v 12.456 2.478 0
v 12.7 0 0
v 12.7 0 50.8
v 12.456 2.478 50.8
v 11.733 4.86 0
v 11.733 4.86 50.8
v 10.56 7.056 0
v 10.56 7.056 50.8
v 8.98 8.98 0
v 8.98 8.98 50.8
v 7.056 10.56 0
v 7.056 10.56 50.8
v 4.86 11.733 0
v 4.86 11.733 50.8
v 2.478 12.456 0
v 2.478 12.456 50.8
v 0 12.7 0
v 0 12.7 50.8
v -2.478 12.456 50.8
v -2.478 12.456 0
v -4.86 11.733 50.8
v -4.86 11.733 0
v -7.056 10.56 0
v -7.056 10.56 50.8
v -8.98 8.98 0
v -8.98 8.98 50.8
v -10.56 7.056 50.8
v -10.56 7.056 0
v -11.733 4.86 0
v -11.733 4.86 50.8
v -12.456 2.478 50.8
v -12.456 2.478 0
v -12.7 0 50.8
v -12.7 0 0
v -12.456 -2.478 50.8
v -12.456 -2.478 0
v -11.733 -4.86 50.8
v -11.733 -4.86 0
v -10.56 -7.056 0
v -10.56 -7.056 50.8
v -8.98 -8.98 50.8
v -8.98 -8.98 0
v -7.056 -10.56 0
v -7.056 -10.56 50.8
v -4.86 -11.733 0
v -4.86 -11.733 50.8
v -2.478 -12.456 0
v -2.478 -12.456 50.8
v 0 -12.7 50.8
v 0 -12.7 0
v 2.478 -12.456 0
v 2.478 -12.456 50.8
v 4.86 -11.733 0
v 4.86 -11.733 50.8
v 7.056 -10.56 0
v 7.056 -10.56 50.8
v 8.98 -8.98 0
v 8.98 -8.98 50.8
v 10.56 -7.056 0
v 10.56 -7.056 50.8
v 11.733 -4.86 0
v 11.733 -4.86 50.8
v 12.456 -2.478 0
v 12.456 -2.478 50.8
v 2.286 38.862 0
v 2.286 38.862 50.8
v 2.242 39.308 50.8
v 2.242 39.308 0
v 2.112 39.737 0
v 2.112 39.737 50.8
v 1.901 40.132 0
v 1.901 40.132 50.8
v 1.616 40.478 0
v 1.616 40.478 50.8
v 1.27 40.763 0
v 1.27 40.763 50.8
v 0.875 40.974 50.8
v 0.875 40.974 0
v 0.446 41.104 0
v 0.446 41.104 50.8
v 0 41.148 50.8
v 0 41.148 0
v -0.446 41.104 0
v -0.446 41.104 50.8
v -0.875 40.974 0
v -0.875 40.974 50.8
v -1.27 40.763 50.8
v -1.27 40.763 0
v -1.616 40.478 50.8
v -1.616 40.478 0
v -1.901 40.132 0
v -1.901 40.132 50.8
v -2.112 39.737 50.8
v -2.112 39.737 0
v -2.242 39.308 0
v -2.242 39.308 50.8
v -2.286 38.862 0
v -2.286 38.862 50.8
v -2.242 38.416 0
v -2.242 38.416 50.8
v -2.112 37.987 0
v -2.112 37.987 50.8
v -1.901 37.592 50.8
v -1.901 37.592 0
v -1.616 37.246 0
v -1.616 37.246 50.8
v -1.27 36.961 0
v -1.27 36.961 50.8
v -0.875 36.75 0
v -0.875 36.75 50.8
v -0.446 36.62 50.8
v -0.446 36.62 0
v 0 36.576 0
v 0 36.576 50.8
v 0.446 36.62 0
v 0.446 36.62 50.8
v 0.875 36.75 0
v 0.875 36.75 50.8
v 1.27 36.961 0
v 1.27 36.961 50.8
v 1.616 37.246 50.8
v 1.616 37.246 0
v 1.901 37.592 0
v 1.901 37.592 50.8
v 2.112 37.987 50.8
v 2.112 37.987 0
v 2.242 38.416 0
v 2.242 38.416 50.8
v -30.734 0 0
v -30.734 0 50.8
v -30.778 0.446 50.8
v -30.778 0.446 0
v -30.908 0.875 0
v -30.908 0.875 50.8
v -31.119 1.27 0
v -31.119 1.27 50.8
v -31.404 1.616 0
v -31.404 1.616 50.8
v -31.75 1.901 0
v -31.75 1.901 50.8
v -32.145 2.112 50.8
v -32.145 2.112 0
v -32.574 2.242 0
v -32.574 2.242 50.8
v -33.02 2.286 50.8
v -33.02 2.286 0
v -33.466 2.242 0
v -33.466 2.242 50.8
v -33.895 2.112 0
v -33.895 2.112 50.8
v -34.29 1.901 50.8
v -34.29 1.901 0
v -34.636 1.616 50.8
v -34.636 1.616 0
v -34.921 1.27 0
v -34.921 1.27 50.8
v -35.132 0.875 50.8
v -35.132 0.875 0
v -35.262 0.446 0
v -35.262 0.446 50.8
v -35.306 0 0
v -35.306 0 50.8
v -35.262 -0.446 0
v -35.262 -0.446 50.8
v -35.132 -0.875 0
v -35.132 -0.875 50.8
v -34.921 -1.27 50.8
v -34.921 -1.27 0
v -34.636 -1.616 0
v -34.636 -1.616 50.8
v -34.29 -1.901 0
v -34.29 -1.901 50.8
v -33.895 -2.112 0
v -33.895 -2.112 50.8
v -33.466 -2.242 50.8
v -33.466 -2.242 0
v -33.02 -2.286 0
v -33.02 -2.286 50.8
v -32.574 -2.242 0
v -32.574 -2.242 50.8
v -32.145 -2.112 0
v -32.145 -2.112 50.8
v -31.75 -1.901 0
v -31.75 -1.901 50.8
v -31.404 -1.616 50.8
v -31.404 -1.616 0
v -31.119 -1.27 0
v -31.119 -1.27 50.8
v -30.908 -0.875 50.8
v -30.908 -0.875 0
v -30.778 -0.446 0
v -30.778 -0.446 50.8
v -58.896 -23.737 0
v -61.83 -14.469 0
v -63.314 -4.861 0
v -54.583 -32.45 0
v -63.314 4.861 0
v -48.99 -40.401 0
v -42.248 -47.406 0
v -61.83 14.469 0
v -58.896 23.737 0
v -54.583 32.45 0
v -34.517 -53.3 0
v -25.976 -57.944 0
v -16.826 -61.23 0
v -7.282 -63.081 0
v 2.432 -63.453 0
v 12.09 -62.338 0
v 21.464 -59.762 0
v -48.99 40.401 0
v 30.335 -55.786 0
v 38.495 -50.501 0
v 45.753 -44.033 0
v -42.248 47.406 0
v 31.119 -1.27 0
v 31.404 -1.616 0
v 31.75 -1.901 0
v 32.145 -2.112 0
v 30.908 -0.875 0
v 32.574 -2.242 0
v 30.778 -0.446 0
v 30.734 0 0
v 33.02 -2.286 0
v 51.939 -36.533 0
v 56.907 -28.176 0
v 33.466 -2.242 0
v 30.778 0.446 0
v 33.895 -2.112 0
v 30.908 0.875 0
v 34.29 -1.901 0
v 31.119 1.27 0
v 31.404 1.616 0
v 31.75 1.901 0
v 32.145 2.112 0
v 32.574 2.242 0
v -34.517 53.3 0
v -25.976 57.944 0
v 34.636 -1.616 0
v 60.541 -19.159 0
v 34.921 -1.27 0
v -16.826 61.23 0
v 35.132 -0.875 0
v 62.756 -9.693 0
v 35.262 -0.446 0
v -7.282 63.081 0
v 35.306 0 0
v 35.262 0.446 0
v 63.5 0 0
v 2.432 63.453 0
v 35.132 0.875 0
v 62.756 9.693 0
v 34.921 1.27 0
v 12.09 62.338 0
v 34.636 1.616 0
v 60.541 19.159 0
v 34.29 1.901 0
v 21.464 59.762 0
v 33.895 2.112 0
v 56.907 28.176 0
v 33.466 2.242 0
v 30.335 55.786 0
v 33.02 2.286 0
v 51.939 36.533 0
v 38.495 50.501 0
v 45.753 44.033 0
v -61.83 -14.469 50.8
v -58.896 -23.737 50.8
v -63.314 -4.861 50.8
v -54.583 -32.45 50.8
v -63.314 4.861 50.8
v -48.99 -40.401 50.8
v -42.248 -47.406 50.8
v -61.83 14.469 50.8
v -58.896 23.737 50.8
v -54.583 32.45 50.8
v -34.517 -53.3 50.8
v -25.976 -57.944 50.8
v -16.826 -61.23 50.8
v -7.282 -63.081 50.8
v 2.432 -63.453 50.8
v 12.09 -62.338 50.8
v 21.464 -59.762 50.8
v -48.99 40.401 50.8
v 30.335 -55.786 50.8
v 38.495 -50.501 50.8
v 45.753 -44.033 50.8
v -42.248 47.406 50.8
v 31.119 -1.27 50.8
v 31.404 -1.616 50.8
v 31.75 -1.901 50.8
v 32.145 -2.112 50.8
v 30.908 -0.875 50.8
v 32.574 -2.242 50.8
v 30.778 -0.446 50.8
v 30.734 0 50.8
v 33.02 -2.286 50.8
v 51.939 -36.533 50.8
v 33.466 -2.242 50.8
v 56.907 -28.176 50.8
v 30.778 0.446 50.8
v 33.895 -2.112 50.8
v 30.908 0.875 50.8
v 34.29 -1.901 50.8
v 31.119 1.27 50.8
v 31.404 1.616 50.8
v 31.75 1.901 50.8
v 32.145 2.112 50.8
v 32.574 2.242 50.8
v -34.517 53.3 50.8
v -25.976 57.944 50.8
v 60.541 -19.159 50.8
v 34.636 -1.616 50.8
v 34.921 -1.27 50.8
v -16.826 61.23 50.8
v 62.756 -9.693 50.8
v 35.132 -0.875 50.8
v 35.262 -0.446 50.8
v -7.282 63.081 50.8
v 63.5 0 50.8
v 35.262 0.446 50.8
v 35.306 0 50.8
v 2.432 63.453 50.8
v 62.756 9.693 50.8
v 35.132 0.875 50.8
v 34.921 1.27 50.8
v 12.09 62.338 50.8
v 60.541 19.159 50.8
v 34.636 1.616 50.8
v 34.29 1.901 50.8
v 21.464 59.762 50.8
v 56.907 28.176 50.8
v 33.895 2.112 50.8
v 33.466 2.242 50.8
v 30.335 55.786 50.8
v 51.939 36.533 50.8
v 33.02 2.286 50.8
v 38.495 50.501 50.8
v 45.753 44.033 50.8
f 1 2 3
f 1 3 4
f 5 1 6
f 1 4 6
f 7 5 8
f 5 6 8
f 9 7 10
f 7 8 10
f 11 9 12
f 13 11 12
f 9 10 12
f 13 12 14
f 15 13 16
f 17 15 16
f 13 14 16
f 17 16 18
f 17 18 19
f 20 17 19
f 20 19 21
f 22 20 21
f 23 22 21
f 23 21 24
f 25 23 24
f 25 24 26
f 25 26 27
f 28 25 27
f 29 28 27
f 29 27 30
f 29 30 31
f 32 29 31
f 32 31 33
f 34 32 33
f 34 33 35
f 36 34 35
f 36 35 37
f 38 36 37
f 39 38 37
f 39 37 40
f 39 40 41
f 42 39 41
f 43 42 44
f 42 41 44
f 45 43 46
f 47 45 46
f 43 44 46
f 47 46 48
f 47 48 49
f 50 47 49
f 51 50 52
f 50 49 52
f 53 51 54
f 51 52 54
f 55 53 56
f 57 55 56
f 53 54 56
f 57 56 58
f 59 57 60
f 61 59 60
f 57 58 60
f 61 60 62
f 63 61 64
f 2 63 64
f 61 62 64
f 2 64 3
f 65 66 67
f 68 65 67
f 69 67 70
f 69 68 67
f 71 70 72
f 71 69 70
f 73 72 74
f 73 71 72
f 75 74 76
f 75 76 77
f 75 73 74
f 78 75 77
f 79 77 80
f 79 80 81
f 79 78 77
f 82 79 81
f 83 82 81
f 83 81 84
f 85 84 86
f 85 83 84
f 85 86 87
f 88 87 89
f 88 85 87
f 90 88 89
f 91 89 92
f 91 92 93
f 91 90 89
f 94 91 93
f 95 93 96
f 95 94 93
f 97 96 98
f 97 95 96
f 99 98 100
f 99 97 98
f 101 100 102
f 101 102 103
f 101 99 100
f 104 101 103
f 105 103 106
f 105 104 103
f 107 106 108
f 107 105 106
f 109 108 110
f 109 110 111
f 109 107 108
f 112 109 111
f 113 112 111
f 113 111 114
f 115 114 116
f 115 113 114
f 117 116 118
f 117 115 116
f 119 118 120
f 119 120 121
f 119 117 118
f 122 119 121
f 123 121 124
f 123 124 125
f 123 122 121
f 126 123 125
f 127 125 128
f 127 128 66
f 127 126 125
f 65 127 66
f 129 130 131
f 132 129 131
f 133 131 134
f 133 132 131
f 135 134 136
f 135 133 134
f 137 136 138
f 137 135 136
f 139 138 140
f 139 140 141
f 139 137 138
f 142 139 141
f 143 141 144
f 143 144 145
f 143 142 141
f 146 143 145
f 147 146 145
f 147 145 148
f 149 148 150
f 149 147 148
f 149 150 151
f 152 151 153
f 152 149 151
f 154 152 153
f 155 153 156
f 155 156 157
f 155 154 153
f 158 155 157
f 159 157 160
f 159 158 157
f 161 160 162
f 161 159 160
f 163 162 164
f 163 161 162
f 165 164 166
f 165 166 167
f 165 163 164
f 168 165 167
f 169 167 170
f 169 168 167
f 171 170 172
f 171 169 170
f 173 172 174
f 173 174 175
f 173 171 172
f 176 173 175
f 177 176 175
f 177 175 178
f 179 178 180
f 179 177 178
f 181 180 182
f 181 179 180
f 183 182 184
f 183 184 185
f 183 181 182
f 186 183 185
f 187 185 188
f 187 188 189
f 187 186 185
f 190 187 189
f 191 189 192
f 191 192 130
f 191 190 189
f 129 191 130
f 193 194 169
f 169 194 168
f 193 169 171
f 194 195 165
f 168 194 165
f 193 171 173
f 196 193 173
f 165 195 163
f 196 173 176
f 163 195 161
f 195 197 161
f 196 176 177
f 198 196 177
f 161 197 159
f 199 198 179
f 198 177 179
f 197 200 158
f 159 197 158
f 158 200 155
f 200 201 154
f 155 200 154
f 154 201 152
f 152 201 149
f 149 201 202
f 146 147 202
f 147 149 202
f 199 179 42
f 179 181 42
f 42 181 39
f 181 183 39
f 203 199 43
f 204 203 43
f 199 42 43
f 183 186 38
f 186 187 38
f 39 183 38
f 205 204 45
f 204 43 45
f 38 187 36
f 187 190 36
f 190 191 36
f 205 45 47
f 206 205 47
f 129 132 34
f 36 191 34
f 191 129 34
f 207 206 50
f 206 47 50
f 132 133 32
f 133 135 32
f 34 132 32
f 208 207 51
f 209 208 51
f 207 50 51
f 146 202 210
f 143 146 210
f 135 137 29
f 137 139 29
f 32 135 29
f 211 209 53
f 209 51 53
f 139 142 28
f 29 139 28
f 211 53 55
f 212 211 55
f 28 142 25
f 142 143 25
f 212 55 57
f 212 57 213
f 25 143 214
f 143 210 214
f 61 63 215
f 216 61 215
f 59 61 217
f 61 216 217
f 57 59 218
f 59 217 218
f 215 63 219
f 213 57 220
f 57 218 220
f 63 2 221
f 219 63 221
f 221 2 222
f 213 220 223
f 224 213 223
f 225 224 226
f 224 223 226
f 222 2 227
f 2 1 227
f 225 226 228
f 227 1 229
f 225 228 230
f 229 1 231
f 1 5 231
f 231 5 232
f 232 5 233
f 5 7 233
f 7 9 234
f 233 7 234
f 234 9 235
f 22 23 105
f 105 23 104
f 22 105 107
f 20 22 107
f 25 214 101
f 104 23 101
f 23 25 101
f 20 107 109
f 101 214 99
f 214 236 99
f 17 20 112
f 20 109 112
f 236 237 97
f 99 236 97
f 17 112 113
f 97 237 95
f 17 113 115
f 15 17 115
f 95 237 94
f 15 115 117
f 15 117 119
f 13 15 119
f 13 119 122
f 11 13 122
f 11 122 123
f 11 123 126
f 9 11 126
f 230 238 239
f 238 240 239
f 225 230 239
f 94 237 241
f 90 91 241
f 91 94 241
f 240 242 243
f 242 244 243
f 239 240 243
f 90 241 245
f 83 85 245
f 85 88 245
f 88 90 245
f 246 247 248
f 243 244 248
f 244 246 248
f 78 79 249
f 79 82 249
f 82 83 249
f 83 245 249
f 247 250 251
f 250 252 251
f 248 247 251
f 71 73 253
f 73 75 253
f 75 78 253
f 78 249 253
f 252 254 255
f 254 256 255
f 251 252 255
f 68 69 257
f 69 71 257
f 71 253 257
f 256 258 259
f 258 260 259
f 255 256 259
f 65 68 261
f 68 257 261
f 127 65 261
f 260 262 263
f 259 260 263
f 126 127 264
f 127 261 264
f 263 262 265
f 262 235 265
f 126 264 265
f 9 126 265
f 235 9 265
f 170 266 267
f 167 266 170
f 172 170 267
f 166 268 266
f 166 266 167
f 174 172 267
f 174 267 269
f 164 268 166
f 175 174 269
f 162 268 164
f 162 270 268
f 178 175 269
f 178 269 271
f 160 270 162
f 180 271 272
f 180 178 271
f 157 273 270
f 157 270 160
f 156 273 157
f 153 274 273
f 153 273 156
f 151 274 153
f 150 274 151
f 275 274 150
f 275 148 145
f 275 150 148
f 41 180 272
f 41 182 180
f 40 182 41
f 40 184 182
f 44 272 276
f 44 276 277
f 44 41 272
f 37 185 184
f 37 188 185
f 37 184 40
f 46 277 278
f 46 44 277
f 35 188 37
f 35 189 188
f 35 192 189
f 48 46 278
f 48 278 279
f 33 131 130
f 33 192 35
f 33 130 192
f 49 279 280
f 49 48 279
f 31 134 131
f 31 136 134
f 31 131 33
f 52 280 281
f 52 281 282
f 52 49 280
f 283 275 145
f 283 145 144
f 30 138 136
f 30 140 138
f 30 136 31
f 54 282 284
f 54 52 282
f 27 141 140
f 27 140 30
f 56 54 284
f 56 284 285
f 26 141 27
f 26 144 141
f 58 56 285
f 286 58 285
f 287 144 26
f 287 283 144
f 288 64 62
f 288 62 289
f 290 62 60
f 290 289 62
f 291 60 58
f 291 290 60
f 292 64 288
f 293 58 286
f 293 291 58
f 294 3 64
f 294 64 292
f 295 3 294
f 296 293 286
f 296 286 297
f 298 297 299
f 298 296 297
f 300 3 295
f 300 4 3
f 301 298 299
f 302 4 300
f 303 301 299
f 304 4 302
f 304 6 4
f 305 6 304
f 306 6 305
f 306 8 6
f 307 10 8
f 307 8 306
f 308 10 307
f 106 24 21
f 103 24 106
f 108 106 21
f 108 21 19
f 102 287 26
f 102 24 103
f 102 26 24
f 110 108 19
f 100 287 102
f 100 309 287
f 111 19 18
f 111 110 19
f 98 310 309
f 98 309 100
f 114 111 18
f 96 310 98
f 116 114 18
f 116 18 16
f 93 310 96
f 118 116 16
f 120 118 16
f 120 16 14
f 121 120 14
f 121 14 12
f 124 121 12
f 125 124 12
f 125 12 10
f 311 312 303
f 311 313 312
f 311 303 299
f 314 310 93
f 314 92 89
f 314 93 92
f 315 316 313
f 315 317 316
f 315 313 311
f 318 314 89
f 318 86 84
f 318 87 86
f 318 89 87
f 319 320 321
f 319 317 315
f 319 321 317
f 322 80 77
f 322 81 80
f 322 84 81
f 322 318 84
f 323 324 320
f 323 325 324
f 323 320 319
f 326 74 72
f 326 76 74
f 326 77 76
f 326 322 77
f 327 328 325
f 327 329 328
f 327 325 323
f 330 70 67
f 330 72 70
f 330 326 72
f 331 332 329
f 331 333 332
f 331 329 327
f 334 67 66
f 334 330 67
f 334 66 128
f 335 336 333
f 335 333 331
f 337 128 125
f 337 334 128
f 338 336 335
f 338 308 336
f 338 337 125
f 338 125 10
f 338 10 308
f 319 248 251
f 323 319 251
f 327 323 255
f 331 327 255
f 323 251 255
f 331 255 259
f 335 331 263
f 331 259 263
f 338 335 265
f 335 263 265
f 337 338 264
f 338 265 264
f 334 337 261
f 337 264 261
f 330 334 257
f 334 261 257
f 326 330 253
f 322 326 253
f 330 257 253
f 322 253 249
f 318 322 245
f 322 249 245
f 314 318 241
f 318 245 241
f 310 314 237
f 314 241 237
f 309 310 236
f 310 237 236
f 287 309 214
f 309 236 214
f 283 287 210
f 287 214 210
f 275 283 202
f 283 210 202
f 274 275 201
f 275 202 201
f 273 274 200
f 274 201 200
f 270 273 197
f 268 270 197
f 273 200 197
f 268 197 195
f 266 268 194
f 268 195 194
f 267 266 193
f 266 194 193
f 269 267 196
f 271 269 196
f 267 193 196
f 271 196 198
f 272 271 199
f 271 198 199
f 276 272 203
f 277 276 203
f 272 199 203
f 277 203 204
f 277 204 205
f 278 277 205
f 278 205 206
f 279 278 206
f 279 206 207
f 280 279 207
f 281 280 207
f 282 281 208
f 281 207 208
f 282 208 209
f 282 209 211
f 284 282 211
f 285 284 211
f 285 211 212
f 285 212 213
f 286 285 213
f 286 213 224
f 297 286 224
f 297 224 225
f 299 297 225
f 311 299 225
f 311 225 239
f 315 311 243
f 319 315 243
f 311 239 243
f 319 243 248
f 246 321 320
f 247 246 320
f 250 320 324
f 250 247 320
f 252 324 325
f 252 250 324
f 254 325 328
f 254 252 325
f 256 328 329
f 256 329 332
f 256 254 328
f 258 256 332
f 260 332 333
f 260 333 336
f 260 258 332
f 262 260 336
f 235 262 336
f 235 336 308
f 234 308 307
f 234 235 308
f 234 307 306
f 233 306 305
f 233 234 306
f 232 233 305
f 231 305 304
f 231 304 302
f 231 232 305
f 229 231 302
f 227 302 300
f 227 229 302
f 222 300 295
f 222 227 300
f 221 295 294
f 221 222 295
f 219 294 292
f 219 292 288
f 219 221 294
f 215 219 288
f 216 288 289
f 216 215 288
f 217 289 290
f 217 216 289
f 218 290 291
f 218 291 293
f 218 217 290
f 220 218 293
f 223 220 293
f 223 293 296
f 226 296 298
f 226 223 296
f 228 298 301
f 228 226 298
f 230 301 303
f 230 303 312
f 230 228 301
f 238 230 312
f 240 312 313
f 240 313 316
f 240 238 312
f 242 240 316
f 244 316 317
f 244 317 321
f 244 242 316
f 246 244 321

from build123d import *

# Parameters (mm, degrees)
SKETCH1_R           = 63.5
SKETCH1_R_2         = 2.286
BOSS_EXTRUDE1_DEPTH = 50.8
SKETCH2_R           = 12.7
CUT_EXTRUDE1_DEPTH  = 51.8


with BuildPart() as part:
    # Sketch1 → Boss-Extrude1 (new body)
    with BuildSketch(Plane.XY):
        Circle(SKETCH1_R)
        with Locations((-33.02, 0)):
            Circle(SKETCH1_R_2, mode=Mode.SUBTRACT)
        with Locations((33.02, 0)):
            Circle(SKETCH1_R_2, mode=Mode.SUBTRACT)
        with Locations((0, 38.862)):
            Circle(SKETCH1_R_2, mode=Mode.SUBTRACT)
    extrude(amount=BOSS_EXTRUDE1_DEPTH)

    # Sketch2 → Cut-Extrude1 (cut, through all)
    with BuildSketch(Plane.XY.offset(50.8)):
        Circle(SKETCH2_R)
    extrude(amount=-CUT_EXTRUDE1_DEPTH, mode=Mode.SUBTRACT)


solid = part.part
